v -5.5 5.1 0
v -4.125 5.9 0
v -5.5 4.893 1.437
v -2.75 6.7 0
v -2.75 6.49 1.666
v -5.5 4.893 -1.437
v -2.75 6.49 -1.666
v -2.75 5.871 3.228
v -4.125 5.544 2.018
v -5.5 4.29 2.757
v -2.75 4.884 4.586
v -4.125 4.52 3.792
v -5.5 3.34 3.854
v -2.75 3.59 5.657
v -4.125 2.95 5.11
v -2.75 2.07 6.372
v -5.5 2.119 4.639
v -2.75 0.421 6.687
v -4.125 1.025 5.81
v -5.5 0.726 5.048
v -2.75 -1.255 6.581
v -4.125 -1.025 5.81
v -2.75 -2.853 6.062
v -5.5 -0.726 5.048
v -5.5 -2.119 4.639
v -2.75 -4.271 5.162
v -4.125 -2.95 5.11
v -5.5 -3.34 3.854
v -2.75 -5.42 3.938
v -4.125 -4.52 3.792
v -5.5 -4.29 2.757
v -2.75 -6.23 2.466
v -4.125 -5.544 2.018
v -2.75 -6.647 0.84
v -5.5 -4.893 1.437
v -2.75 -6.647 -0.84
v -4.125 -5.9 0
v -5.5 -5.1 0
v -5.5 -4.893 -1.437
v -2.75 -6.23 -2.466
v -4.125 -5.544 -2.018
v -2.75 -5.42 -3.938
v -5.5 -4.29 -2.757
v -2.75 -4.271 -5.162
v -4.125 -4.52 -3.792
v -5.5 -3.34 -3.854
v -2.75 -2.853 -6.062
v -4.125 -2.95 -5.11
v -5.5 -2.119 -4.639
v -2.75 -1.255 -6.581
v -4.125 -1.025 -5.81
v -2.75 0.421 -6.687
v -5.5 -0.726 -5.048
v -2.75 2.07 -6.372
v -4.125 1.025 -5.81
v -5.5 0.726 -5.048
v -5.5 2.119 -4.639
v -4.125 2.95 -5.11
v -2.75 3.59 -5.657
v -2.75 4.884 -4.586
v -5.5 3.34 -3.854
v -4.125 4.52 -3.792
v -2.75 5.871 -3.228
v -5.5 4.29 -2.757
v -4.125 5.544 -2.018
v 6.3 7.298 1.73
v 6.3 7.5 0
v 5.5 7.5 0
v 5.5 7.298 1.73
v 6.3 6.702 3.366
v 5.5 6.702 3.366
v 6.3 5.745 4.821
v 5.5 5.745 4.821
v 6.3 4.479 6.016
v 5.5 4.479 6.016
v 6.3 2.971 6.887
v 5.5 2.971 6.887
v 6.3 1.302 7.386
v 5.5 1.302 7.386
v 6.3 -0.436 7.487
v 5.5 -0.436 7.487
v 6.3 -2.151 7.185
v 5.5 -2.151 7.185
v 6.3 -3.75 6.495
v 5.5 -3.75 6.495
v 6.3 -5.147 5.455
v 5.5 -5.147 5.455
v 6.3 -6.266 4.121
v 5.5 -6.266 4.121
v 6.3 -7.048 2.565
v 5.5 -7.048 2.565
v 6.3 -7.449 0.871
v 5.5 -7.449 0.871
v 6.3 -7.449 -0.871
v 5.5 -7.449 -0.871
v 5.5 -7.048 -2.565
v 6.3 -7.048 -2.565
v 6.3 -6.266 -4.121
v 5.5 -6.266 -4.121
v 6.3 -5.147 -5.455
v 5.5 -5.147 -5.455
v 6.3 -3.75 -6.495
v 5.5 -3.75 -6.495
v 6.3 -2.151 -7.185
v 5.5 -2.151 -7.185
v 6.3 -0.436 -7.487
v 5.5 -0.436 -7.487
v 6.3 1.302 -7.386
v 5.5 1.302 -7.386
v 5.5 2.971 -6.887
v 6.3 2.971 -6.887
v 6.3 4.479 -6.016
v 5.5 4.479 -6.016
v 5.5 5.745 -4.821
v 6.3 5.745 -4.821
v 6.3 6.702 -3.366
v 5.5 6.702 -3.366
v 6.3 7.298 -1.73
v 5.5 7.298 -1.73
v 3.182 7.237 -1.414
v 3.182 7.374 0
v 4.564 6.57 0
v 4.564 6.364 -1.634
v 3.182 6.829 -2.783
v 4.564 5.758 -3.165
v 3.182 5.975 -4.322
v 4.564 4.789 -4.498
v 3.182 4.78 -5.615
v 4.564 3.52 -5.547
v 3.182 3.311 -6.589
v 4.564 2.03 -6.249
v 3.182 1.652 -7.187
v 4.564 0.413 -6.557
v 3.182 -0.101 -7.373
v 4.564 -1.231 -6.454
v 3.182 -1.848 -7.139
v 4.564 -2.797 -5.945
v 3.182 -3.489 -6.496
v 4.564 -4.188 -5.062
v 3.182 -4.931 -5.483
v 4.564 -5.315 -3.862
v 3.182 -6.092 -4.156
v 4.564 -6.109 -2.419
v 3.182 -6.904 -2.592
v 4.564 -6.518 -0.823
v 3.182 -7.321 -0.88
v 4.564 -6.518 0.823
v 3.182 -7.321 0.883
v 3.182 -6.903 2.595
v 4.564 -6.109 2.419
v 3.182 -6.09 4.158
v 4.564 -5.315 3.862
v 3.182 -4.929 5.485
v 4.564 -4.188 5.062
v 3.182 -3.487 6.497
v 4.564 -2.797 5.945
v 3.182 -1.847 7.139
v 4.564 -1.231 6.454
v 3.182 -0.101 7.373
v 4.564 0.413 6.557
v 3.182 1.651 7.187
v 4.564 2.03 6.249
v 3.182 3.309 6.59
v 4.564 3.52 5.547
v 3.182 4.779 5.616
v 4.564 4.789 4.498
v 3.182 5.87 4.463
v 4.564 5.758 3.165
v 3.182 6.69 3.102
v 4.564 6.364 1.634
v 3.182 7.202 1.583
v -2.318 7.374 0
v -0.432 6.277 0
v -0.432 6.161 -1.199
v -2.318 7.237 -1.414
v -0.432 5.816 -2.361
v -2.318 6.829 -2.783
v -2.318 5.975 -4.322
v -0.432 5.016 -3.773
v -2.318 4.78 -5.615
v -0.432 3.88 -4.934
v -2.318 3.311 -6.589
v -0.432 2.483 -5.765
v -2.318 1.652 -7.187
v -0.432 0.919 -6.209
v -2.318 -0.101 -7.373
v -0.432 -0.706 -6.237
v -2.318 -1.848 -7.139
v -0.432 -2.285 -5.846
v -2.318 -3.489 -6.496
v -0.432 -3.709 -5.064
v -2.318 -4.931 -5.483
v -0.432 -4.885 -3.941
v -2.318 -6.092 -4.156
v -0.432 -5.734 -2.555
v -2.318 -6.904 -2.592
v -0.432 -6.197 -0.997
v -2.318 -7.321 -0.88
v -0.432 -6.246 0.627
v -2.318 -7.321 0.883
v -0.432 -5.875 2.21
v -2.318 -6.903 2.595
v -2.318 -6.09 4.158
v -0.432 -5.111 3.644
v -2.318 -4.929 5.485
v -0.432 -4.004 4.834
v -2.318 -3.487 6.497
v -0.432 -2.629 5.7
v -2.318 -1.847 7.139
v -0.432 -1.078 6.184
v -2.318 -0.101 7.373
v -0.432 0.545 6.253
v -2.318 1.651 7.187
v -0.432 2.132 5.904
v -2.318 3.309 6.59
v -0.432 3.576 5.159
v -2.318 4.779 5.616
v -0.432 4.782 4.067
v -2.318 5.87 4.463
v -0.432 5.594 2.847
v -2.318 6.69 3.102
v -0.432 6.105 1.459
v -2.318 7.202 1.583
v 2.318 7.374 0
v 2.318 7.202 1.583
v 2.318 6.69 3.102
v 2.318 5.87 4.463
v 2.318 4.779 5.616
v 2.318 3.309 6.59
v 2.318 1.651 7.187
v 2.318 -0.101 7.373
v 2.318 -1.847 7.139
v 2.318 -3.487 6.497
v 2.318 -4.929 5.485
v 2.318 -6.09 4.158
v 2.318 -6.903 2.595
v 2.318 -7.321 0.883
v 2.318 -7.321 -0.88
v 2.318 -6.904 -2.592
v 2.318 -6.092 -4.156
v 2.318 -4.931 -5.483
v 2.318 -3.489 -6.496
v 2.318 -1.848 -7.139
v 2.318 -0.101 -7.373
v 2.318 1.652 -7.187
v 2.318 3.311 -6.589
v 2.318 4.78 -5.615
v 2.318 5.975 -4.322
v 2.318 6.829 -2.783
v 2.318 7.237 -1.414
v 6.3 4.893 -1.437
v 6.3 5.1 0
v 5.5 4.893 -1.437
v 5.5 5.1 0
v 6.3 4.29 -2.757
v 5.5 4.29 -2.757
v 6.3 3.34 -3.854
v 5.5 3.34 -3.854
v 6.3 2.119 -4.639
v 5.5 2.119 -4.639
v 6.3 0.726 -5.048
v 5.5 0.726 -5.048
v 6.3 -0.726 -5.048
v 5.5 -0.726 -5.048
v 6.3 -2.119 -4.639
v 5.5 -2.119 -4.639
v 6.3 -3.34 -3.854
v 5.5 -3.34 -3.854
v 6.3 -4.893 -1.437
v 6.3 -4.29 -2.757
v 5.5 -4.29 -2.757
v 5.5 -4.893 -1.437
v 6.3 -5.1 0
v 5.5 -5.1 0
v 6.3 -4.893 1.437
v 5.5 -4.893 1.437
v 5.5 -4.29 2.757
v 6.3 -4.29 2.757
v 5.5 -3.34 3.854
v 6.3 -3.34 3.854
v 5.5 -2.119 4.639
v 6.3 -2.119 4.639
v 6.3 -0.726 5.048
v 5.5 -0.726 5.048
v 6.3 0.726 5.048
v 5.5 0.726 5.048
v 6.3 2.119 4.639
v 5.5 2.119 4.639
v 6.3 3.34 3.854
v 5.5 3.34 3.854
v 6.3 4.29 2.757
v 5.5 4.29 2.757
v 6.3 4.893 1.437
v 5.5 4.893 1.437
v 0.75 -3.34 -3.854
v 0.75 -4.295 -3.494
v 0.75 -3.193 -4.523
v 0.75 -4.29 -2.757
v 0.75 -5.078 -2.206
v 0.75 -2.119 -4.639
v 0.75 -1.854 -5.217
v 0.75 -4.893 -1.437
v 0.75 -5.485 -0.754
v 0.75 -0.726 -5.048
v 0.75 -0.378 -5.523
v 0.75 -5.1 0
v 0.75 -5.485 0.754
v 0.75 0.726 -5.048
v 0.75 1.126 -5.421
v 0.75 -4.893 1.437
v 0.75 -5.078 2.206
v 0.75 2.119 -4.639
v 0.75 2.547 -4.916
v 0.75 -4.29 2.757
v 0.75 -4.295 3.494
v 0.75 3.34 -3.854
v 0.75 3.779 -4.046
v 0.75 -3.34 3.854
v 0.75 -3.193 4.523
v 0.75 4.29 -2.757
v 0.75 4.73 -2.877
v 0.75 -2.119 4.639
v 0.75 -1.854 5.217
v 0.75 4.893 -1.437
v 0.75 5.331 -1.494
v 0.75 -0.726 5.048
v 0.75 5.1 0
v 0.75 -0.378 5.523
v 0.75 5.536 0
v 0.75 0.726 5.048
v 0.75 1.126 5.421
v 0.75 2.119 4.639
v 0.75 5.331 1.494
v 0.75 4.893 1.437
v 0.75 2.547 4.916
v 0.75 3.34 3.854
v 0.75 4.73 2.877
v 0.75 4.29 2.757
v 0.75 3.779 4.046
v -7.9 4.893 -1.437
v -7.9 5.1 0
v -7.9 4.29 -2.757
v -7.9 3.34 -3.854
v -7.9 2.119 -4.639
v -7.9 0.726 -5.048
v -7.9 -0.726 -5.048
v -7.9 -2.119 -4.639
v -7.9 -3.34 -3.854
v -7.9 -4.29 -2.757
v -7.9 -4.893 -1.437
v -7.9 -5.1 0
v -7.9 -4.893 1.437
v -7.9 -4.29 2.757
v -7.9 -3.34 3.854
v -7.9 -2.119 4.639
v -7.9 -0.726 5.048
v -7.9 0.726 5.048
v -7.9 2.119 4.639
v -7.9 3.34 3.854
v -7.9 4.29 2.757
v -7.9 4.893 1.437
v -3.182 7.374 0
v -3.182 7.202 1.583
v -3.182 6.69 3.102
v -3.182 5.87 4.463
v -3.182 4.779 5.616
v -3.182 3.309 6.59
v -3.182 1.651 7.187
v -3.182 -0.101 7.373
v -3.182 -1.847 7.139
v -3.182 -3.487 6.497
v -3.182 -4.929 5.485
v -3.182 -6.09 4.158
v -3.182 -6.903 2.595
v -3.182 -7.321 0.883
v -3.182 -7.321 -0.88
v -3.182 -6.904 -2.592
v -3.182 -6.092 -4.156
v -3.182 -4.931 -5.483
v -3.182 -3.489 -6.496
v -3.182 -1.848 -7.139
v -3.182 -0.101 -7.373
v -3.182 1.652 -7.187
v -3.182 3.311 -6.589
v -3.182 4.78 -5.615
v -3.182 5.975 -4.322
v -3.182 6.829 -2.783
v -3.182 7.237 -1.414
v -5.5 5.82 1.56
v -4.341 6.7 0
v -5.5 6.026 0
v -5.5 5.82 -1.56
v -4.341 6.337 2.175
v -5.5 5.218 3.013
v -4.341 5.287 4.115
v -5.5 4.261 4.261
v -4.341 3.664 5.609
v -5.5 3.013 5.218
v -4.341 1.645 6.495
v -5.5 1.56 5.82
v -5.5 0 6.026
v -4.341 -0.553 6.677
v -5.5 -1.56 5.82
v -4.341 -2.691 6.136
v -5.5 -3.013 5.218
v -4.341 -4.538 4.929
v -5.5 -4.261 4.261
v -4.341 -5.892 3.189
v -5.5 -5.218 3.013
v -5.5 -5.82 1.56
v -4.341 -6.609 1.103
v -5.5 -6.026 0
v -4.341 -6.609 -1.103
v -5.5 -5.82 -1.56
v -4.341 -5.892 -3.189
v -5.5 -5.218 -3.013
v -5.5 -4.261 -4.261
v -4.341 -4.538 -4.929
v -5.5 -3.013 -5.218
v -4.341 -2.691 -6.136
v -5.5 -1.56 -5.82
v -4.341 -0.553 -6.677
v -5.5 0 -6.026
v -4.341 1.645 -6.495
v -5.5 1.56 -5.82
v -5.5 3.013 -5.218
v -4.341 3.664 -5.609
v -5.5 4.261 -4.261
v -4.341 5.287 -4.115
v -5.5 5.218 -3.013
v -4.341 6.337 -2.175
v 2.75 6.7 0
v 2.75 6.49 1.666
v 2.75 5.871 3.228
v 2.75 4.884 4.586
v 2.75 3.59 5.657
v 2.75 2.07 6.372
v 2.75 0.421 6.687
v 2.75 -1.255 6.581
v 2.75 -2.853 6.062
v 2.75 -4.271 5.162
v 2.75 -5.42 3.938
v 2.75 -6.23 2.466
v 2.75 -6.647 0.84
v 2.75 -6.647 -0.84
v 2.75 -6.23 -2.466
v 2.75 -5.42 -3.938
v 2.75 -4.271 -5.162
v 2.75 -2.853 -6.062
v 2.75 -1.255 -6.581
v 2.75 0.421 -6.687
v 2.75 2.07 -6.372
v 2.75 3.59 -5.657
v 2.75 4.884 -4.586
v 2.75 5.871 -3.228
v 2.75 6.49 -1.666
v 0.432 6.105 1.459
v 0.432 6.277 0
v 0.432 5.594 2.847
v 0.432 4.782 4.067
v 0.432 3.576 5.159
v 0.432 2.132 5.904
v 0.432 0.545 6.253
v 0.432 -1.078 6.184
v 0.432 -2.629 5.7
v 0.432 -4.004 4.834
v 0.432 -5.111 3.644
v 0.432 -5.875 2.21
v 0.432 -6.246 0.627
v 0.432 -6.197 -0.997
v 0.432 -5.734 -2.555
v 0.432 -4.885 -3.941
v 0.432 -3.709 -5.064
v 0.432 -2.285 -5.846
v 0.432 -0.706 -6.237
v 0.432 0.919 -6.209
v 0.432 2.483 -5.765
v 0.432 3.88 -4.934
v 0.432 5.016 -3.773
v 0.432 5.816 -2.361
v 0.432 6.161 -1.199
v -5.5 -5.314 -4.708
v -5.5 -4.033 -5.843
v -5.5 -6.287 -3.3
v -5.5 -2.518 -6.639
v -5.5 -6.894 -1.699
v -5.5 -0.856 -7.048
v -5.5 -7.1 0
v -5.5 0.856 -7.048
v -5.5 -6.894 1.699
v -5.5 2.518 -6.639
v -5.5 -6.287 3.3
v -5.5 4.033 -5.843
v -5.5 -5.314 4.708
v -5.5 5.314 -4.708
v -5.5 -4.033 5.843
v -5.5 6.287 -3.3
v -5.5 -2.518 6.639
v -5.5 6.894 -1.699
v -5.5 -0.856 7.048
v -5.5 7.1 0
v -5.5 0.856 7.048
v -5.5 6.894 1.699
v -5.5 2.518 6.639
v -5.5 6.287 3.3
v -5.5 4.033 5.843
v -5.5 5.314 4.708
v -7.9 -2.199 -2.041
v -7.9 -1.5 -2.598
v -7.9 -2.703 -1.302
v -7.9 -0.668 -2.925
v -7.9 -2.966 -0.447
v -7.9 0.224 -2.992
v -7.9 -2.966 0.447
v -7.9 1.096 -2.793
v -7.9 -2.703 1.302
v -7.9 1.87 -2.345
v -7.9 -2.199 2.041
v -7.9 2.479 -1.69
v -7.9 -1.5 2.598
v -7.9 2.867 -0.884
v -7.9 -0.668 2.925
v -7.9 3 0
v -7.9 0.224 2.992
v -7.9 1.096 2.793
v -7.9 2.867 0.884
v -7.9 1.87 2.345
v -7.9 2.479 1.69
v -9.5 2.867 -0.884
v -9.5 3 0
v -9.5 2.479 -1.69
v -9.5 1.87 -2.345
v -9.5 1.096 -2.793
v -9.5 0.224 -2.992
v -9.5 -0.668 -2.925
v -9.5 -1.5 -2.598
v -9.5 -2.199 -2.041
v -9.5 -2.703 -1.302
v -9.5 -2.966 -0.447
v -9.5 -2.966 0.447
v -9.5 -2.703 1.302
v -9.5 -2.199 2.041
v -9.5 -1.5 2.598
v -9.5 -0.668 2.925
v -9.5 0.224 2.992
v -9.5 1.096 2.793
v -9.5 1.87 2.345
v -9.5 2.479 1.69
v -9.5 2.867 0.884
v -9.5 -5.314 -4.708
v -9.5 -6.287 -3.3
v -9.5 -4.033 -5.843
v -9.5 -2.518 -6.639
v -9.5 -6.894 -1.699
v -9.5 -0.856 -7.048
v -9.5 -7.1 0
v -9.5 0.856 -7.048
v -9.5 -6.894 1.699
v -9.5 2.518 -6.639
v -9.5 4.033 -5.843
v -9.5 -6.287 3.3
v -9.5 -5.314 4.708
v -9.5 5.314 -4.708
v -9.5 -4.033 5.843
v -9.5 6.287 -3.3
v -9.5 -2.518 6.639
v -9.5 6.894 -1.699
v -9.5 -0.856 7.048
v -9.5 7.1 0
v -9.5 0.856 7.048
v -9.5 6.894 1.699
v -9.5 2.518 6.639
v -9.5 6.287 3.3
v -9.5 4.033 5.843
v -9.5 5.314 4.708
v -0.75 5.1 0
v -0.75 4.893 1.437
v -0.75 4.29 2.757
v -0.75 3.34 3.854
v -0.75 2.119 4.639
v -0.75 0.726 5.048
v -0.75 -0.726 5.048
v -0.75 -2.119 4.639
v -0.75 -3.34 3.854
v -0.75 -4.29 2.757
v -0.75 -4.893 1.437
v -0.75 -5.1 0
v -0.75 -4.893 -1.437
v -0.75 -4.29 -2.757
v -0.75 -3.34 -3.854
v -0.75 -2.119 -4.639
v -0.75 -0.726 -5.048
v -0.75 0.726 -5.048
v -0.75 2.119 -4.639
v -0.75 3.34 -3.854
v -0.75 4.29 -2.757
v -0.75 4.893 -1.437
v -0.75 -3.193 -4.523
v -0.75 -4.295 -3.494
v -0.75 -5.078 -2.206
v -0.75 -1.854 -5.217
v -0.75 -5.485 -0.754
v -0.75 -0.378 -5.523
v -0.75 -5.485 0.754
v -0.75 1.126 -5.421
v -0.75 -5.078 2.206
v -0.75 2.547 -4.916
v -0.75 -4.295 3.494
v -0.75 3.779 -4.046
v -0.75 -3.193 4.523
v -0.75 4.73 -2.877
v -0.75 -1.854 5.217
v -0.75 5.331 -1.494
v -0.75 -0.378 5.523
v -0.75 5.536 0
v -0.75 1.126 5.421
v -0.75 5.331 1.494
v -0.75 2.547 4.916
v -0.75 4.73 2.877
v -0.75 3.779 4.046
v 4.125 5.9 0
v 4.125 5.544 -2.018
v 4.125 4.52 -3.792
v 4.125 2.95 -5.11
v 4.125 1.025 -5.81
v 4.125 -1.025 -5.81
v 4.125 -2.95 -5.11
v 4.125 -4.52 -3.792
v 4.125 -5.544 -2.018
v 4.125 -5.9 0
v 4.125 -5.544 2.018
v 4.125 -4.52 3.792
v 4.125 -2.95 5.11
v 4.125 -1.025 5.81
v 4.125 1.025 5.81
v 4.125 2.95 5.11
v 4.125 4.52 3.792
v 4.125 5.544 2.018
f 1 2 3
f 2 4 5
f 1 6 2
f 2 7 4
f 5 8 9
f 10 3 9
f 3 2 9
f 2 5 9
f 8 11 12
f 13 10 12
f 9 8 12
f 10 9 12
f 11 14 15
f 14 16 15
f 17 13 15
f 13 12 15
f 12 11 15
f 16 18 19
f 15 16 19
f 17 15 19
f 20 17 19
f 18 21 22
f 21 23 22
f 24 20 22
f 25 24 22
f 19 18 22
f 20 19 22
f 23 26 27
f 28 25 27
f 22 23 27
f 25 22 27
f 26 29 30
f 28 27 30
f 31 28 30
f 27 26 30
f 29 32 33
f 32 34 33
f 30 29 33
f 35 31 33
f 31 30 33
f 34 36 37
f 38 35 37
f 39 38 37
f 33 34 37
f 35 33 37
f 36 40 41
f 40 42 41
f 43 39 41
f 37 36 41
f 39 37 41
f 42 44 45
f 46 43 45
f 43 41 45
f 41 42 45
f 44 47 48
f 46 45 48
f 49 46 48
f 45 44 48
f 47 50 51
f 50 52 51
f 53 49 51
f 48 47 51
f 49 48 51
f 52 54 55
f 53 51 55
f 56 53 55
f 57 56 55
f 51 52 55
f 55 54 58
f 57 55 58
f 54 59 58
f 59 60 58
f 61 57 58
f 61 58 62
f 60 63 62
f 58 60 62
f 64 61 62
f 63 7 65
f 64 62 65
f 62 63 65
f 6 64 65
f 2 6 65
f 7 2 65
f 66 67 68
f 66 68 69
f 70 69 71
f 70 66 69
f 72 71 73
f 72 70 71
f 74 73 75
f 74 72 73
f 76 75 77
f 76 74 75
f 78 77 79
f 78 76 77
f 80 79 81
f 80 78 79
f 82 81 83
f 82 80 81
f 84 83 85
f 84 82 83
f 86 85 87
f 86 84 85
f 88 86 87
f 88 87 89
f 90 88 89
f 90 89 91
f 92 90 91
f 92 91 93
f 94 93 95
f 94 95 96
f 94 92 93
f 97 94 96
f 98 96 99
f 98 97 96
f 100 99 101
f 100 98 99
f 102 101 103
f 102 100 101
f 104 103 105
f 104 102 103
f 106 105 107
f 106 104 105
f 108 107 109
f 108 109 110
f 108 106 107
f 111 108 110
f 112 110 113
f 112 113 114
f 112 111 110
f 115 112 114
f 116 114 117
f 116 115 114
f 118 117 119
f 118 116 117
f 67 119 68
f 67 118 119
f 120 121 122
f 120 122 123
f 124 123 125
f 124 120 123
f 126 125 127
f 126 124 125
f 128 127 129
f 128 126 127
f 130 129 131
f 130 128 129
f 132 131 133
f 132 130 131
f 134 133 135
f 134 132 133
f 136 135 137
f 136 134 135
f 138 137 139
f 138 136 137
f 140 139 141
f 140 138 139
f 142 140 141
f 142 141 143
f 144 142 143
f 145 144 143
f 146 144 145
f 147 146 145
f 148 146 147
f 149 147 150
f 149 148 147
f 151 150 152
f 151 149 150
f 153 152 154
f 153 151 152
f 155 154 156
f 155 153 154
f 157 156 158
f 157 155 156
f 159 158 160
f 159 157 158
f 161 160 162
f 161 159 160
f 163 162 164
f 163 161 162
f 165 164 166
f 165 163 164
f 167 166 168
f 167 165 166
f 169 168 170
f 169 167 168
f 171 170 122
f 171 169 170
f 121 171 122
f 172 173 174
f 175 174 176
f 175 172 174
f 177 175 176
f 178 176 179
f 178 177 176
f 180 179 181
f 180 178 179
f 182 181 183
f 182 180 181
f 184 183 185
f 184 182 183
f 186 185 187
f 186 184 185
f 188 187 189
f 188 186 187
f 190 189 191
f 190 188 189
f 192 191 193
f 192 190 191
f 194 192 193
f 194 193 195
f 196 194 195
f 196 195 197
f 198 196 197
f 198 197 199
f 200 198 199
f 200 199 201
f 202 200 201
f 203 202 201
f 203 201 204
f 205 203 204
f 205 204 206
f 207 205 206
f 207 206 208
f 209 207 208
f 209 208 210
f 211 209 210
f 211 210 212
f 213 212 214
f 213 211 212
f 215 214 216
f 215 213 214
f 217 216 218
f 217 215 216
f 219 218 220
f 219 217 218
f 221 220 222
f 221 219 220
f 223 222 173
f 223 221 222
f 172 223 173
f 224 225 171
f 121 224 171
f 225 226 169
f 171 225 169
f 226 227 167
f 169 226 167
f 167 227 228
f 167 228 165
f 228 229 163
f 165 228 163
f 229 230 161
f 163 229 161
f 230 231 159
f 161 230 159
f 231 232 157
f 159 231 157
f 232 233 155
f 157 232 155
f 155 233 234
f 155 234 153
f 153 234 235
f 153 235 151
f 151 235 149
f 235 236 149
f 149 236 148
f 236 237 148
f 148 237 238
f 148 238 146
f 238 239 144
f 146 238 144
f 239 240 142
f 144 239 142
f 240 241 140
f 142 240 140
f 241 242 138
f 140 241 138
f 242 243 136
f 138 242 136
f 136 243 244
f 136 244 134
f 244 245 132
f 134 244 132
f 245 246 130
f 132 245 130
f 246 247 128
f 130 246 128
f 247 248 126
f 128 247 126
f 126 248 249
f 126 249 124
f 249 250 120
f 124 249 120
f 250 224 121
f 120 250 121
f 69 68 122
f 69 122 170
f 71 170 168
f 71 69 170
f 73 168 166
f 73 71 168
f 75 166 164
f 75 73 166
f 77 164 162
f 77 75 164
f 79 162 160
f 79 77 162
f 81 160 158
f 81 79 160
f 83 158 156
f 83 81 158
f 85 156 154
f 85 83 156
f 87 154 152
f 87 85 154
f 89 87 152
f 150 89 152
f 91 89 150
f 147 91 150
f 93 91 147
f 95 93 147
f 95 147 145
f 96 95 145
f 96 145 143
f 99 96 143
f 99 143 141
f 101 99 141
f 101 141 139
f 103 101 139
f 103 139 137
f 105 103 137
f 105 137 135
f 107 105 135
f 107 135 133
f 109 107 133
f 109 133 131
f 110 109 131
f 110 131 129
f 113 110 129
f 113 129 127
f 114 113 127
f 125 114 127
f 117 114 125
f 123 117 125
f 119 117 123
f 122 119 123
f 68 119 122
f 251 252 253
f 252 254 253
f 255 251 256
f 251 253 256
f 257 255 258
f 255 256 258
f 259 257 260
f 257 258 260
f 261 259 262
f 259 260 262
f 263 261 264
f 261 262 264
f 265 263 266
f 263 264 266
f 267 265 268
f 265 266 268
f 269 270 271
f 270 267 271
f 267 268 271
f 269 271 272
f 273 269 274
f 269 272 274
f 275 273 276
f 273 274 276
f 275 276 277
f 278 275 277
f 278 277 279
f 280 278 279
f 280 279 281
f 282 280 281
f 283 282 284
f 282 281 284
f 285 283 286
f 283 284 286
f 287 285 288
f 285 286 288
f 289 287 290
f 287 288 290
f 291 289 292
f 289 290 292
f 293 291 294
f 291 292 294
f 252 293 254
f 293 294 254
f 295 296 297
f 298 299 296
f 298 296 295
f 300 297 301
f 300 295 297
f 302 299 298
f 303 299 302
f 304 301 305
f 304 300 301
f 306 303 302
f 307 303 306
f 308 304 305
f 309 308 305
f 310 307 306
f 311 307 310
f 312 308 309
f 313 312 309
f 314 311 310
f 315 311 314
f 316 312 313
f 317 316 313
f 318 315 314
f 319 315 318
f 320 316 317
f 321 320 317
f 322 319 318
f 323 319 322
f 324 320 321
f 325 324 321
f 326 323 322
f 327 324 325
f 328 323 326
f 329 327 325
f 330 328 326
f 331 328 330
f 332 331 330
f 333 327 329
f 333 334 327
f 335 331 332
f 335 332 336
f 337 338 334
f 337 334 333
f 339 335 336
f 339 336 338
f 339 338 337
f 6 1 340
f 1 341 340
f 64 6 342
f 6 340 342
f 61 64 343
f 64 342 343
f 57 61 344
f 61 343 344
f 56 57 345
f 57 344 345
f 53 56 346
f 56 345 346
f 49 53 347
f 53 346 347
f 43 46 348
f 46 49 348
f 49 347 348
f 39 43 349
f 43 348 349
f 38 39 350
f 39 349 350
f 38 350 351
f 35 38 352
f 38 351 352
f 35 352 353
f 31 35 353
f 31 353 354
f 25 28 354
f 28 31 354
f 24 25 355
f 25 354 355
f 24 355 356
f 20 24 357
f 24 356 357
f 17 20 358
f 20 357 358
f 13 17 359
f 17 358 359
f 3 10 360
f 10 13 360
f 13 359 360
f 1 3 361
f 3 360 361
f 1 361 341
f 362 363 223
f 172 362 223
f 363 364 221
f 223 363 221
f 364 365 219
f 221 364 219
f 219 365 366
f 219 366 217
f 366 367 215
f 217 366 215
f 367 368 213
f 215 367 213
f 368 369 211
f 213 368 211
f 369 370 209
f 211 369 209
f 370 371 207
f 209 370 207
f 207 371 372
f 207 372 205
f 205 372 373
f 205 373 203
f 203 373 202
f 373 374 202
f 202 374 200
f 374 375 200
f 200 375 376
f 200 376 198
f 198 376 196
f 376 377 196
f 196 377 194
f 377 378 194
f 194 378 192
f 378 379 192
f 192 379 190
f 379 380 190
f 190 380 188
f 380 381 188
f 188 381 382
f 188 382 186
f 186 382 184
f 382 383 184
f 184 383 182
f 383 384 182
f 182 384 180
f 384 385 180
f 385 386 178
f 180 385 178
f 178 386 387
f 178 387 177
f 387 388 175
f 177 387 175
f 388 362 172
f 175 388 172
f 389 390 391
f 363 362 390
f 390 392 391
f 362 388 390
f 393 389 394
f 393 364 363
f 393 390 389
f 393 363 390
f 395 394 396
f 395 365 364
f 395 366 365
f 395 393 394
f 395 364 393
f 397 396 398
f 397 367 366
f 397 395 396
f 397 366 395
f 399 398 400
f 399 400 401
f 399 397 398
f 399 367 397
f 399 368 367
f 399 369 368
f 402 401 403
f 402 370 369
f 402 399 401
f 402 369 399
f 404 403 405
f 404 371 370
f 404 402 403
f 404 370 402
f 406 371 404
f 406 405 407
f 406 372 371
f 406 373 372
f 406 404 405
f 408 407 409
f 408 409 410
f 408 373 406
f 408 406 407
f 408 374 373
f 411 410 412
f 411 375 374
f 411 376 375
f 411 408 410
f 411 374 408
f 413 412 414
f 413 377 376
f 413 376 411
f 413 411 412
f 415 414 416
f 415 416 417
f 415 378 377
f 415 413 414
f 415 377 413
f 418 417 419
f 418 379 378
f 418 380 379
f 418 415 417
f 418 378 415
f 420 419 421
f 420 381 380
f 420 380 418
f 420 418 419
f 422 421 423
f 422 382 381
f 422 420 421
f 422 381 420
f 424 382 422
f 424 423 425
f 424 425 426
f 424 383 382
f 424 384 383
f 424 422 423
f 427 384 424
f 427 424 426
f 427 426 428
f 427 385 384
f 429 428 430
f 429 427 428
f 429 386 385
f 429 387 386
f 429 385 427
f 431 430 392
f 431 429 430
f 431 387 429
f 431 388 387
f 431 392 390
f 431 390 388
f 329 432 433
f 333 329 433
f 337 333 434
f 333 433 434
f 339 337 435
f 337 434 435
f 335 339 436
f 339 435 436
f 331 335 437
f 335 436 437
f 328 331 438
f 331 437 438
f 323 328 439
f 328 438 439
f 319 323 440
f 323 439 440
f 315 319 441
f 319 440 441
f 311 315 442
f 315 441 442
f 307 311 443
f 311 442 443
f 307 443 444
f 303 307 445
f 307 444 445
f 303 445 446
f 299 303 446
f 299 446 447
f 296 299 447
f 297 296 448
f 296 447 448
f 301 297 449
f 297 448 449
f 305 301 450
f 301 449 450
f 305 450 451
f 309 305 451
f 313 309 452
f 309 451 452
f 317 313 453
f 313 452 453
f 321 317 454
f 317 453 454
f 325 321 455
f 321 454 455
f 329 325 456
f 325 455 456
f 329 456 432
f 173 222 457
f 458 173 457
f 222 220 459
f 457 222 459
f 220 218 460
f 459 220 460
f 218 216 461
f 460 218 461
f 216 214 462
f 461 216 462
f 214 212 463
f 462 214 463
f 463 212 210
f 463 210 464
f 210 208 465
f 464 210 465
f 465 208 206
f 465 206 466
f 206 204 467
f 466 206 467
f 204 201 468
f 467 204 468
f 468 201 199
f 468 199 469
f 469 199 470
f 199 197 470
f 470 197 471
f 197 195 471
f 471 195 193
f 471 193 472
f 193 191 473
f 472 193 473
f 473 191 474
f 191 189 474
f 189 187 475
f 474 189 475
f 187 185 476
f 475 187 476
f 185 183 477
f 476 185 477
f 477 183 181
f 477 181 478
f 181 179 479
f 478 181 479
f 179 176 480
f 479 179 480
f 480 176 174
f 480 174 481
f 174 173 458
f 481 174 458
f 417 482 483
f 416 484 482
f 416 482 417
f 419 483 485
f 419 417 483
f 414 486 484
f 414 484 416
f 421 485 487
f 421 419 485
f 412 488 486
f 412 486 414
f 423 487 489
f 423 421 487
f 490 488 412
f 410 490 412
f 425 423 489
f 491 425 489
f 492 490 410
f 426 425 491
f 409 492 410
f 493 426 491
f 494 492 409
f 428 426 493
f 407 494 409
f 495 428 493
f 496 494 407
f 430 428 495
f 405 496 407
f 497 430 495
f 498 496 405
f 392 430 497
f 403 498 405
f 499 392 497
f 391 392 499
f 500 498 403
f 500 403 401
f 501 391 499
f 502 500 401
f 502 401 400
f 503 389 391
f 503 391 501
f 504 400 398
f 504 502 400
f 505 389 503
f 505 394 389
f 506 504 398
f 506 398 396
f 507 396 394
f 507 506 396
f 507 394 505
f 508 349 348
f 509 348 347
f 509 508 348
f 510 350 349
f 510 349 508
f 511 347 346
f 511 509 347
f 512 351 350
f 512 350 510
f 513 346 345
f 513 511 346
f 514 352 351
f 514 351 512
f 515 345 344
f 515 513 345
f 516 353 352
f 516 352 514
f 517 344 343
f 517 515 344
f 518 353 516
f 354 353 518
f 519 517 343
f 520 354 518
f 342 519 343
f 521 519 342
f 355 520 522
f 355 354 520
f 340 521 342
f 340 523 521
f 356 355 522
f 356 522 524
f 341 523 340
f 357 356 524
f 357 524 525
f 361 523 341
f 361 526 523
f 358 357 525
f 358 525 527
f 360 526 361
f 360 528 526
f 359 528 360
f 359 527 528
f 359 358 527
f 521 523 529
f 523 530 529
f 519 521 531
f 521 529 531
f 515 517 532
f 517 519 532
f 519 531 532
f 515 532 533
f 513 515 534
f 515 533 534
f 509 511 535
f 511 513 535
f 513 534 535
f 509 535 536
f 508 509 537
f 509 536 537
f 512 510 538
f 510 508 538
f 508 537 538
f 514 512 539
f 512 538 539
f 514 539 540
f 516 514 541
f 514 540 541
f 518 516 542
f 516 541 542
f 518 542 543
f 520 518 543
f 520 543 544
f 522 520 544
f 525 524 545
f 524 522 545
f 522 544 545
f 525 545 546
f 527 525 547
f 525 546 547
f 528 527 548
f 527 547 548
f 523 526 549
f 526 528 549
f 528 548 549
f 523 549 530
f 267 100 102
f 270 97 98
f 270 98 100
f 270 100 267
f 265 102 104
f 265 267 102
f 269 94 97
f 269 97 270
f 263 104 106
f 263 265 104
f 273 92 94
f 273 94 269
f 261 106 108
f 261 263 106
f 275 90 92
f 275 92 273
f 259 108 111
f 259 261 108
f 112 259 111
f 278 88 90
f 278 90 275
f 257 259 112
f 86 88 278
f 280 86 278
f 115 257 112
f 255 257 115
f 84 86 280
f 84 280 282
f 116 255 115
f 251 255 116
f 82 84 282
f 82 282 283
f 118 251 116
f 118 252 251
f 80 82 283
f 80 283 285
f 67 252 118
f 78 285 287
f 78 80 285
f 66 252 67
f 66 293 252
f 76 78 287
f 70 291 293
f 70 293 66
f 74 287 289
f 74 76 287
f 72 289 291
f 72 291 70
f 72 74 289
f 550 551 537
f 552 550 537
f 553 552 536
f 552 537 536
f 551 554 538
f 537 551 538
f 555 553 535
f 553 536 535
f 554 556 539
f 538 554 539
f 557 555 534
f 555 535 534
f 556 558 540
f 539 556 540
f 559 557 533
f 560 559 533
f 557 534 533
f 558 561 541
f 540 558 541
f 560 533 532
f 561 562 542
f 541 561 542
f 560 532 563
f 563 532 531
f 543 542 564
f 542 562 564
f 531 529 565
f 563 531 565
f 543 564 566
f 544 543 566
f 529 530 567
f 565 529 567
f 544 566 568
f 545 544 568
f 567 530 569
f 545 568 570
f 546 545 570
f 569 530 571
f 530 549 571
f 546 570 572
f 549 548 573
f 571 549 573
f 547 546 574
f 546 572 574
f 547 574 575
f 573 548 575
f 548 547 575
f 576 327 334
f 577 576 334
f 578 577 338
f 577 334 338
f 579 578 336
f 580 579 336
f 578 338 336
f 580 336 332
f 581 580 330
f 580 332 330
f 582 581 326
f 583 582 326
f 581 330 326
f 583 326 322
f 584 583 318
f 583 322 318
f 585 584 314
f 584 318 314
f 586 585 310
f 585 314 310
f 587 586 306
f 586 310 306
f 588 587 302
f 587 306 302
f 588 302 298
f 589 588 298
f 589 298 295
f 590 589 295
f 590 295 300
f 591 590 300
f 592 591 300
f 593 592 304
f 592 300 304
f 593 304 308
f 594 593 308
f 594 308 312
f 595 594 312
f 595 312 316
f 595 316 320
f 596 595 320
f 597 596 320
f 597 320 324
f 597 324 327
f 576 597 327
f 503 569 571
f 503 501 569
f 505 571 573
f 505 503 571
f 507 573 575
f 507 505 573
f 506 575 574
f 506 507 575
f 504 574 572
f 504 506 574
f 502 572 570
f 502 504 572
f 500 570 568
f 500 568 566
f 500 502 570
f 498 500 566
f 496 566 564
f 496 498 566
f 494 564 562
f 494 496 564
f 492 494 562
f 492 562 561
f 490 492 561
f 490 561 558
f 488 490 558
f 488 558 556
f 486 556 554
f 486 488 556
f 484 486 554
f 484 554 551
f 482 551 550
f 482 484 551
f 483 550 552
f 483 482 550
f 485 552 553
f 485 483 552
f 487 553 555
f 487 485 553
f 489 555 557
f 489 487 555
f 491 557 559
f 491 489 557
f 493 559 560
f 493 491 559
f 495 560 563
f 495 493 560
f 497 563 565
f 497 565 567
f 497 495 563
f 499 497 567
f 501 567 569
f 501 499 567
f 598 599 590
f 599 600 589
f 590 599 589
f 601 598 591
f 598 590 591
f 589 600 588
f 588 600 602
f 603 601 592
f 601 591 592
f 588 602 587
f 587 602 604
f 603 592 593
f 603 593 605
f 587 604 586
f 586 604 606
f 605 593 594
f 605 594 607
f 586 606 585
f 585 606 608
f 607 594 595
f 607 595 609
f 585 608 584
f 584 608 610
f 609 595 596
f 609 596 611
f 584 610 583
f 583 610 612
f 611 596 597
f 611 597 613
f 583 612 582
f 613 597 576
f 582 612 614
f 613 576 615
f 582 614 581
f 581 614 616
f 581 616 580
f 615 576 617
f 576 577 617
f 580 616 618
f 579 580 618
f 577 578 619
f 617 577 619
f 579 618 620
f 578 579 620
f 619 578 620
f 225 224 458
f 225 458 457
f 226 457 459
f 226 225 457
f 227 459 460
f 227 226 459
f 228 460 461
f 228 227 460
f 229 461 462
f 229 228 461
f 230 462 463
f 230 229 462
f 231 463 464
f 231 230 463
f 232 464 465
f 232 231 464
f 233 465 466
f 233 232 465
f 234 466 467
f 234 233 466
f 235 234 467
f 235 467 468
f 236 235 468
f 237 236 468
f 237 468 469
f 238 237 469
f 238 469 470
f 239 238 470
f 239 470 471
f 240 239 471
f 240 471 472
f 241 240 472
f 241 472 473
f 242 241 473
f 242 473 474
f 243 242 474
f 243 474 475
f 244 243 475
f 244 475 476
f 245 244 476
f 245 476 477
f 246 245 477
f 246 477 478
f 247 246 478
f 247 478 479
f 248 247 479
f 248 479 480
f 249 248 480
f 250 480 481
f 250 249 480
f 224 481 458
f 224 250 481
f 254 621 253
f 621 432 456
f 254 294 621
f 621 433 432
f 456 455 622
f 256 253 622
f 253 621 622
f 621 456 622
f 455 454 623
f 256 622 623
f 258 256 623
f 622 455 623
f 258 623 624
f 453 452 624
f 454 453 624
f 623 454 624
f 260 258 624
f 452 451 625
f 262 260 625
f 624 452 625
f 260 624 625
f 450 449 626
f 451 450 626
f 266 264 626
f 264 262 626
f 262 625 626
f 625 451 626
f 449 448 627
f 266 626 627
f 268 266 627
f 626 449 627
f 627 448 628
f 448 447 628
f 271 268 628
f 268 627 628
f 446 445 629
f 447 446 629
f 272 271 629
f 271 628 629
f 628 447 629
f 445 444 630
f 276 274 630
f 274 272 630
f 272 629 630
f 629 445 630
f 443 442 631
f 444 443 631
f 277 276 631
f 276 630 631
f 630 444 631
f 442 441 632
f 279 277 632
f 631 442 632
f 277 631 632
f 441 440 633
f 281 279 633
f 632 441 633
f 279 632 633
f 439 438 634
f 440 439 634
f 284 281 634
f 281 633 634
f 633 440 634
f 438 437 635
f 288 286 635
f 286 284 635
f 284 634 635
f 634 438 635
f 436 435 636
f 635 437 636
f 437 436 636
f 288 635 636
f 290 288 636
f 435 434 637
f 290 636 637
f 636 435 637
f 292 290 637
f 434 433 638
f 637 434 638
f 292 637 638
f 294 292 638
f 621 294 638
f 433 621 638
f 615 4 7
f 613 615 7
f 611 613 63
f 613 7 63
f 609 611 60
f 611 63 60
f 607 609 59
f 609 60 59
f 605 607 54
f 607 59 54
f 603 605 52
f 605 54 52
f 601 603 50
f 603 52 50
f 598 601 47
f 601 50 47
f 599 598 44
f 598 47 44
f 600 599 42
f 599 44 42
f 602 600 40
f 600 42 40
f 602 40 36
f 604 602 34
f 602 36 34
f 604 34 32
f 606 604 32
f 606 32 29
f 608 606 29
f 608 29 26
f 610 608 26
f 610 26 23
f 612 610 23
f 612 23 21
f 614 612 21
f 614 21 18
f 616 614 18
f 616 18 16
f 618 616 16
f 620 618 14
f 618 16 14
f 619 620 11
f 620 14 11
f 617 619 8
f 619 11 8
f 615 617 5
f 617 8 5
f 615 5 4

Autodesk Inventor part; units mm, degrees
ref_plane "YZ Plane" through (0, 0, 0) normal (1, 0, 0) x (0, 1, 0)
ref_plane "XZ Plane" through (0, 0, 0) normal (0, 1, 0) x (-1, 0, 0)
ref_plane "XY Plane" through (0, 0, 0) normal (0, 0, 1) x (1, 0, 0)
sketch "Skizze1" plane through (0, 0, 0) normal (0, 0, 1) x (1, 0, 0)
  line L0 (-15, 0) -> (15, 0)
  line L1 (-5.5, 5.1) -> (-2.75, 6.7)
  line L2 (-2.75, 6.7) -> (0, 5.1)
  line L3 (0, 5.1) -> (2.75, 6.7)
  line L4 (2.75, 6.7) -> (5.5, 5.1)
  line L5 (-5.5, 5.1) -> (5.5, 5.1) construction
  line L6 (-2.75, 6.7) -> (2.75, 6.7) construction
  line L7 (0, 5.1) -> (5.5, 5.1) construction
  line L8 (5.5, 6.0256) -> (2.75, 7.6256)
  line L9 (2.75, 7.6256) -> (0, 6.0256)
  line L10 (0, 6.0256) -> (-2.75, 7.6256)
  line L11 (-2.75, 7.6256) -> (-5.5, 6.0256)
  line L12 (-5.5, 5.1) -> (-7.9, 5.1)
  line L13 (-7.9, 5.1) -> (-7.9, 3)
  line L14 (-7.9, 3) -> (-9.5, 3)
  line L15 (-9.5, 3) -> (-9.5, 7.1)
  line L16 (-9.5, 7.1) -> (-5.5, 7.1)
  line L17 (-5.5, 7.1) -> (-5.5, 6.0256)
  line L18 (5.5, 5.1) -> (5.5, 6.0256)
  line L19 (4.5639, 6.5702) -> (5.5, 7.5)
  line L20 (5.5, 7.5) -> (5.5, 6.0256)
  line L21 (5.5, 7.5) -> (6.3, 7.5)
  line L22 (6.3, 7.5) -> (6.3, 5.1)
  line L23 (6.3, 5.1) -> (5.5, 5.1)
  line L24 (5.5, 5.1) -> (5.5, 7.5)
  line L25 (-0.75, 5.1) -> (0.75, 5.1)
  line L26 (0.75, 5.1) -> (0.75, 5.5364)
  line L27 (0.75, 5.5364) -> (-0.75, 5.5364)
  line L28 (-0.75, 5.5364) -> (-0.75, 5.1)
  point P0 (0, 0)
  point P1 (0, 0)
  point P2 (0, 6.7)
  point P3 (2.75, 5.1)
  point P4 (0, 5.5364)
  point P5 (-0.75, 5.5364)
  dimension "d37" = 0.8
  dimension "d38" = 6
  dimension "d39" = 10.2
  dimension "d40" = 2
  dimension "d41" = 1.6
  dimension "d42" = 11
  dimension "d43" = 4
  dimension "d44" = 1.6
  dimension "d45" = 30
  dimension "d46" = 75
  dimension "d47" = 15
  dimension "d49" = 0.8
  dimension "d50" = 1.5
revolve "Umdrehung2" add sketch "Skizze1" angle 360 about axis through (-15, 0, 0) along (1, 0, 0)
chamfer "Fase3" distance 0.5 angle 45 3 edges at (-2.75, -7.6256, 0) (2.75, -7.6256, 0) (0, -6.0256, 0)
properties part number "Daemper_TPU_Z2" material "Thermoplastisches Harz"
